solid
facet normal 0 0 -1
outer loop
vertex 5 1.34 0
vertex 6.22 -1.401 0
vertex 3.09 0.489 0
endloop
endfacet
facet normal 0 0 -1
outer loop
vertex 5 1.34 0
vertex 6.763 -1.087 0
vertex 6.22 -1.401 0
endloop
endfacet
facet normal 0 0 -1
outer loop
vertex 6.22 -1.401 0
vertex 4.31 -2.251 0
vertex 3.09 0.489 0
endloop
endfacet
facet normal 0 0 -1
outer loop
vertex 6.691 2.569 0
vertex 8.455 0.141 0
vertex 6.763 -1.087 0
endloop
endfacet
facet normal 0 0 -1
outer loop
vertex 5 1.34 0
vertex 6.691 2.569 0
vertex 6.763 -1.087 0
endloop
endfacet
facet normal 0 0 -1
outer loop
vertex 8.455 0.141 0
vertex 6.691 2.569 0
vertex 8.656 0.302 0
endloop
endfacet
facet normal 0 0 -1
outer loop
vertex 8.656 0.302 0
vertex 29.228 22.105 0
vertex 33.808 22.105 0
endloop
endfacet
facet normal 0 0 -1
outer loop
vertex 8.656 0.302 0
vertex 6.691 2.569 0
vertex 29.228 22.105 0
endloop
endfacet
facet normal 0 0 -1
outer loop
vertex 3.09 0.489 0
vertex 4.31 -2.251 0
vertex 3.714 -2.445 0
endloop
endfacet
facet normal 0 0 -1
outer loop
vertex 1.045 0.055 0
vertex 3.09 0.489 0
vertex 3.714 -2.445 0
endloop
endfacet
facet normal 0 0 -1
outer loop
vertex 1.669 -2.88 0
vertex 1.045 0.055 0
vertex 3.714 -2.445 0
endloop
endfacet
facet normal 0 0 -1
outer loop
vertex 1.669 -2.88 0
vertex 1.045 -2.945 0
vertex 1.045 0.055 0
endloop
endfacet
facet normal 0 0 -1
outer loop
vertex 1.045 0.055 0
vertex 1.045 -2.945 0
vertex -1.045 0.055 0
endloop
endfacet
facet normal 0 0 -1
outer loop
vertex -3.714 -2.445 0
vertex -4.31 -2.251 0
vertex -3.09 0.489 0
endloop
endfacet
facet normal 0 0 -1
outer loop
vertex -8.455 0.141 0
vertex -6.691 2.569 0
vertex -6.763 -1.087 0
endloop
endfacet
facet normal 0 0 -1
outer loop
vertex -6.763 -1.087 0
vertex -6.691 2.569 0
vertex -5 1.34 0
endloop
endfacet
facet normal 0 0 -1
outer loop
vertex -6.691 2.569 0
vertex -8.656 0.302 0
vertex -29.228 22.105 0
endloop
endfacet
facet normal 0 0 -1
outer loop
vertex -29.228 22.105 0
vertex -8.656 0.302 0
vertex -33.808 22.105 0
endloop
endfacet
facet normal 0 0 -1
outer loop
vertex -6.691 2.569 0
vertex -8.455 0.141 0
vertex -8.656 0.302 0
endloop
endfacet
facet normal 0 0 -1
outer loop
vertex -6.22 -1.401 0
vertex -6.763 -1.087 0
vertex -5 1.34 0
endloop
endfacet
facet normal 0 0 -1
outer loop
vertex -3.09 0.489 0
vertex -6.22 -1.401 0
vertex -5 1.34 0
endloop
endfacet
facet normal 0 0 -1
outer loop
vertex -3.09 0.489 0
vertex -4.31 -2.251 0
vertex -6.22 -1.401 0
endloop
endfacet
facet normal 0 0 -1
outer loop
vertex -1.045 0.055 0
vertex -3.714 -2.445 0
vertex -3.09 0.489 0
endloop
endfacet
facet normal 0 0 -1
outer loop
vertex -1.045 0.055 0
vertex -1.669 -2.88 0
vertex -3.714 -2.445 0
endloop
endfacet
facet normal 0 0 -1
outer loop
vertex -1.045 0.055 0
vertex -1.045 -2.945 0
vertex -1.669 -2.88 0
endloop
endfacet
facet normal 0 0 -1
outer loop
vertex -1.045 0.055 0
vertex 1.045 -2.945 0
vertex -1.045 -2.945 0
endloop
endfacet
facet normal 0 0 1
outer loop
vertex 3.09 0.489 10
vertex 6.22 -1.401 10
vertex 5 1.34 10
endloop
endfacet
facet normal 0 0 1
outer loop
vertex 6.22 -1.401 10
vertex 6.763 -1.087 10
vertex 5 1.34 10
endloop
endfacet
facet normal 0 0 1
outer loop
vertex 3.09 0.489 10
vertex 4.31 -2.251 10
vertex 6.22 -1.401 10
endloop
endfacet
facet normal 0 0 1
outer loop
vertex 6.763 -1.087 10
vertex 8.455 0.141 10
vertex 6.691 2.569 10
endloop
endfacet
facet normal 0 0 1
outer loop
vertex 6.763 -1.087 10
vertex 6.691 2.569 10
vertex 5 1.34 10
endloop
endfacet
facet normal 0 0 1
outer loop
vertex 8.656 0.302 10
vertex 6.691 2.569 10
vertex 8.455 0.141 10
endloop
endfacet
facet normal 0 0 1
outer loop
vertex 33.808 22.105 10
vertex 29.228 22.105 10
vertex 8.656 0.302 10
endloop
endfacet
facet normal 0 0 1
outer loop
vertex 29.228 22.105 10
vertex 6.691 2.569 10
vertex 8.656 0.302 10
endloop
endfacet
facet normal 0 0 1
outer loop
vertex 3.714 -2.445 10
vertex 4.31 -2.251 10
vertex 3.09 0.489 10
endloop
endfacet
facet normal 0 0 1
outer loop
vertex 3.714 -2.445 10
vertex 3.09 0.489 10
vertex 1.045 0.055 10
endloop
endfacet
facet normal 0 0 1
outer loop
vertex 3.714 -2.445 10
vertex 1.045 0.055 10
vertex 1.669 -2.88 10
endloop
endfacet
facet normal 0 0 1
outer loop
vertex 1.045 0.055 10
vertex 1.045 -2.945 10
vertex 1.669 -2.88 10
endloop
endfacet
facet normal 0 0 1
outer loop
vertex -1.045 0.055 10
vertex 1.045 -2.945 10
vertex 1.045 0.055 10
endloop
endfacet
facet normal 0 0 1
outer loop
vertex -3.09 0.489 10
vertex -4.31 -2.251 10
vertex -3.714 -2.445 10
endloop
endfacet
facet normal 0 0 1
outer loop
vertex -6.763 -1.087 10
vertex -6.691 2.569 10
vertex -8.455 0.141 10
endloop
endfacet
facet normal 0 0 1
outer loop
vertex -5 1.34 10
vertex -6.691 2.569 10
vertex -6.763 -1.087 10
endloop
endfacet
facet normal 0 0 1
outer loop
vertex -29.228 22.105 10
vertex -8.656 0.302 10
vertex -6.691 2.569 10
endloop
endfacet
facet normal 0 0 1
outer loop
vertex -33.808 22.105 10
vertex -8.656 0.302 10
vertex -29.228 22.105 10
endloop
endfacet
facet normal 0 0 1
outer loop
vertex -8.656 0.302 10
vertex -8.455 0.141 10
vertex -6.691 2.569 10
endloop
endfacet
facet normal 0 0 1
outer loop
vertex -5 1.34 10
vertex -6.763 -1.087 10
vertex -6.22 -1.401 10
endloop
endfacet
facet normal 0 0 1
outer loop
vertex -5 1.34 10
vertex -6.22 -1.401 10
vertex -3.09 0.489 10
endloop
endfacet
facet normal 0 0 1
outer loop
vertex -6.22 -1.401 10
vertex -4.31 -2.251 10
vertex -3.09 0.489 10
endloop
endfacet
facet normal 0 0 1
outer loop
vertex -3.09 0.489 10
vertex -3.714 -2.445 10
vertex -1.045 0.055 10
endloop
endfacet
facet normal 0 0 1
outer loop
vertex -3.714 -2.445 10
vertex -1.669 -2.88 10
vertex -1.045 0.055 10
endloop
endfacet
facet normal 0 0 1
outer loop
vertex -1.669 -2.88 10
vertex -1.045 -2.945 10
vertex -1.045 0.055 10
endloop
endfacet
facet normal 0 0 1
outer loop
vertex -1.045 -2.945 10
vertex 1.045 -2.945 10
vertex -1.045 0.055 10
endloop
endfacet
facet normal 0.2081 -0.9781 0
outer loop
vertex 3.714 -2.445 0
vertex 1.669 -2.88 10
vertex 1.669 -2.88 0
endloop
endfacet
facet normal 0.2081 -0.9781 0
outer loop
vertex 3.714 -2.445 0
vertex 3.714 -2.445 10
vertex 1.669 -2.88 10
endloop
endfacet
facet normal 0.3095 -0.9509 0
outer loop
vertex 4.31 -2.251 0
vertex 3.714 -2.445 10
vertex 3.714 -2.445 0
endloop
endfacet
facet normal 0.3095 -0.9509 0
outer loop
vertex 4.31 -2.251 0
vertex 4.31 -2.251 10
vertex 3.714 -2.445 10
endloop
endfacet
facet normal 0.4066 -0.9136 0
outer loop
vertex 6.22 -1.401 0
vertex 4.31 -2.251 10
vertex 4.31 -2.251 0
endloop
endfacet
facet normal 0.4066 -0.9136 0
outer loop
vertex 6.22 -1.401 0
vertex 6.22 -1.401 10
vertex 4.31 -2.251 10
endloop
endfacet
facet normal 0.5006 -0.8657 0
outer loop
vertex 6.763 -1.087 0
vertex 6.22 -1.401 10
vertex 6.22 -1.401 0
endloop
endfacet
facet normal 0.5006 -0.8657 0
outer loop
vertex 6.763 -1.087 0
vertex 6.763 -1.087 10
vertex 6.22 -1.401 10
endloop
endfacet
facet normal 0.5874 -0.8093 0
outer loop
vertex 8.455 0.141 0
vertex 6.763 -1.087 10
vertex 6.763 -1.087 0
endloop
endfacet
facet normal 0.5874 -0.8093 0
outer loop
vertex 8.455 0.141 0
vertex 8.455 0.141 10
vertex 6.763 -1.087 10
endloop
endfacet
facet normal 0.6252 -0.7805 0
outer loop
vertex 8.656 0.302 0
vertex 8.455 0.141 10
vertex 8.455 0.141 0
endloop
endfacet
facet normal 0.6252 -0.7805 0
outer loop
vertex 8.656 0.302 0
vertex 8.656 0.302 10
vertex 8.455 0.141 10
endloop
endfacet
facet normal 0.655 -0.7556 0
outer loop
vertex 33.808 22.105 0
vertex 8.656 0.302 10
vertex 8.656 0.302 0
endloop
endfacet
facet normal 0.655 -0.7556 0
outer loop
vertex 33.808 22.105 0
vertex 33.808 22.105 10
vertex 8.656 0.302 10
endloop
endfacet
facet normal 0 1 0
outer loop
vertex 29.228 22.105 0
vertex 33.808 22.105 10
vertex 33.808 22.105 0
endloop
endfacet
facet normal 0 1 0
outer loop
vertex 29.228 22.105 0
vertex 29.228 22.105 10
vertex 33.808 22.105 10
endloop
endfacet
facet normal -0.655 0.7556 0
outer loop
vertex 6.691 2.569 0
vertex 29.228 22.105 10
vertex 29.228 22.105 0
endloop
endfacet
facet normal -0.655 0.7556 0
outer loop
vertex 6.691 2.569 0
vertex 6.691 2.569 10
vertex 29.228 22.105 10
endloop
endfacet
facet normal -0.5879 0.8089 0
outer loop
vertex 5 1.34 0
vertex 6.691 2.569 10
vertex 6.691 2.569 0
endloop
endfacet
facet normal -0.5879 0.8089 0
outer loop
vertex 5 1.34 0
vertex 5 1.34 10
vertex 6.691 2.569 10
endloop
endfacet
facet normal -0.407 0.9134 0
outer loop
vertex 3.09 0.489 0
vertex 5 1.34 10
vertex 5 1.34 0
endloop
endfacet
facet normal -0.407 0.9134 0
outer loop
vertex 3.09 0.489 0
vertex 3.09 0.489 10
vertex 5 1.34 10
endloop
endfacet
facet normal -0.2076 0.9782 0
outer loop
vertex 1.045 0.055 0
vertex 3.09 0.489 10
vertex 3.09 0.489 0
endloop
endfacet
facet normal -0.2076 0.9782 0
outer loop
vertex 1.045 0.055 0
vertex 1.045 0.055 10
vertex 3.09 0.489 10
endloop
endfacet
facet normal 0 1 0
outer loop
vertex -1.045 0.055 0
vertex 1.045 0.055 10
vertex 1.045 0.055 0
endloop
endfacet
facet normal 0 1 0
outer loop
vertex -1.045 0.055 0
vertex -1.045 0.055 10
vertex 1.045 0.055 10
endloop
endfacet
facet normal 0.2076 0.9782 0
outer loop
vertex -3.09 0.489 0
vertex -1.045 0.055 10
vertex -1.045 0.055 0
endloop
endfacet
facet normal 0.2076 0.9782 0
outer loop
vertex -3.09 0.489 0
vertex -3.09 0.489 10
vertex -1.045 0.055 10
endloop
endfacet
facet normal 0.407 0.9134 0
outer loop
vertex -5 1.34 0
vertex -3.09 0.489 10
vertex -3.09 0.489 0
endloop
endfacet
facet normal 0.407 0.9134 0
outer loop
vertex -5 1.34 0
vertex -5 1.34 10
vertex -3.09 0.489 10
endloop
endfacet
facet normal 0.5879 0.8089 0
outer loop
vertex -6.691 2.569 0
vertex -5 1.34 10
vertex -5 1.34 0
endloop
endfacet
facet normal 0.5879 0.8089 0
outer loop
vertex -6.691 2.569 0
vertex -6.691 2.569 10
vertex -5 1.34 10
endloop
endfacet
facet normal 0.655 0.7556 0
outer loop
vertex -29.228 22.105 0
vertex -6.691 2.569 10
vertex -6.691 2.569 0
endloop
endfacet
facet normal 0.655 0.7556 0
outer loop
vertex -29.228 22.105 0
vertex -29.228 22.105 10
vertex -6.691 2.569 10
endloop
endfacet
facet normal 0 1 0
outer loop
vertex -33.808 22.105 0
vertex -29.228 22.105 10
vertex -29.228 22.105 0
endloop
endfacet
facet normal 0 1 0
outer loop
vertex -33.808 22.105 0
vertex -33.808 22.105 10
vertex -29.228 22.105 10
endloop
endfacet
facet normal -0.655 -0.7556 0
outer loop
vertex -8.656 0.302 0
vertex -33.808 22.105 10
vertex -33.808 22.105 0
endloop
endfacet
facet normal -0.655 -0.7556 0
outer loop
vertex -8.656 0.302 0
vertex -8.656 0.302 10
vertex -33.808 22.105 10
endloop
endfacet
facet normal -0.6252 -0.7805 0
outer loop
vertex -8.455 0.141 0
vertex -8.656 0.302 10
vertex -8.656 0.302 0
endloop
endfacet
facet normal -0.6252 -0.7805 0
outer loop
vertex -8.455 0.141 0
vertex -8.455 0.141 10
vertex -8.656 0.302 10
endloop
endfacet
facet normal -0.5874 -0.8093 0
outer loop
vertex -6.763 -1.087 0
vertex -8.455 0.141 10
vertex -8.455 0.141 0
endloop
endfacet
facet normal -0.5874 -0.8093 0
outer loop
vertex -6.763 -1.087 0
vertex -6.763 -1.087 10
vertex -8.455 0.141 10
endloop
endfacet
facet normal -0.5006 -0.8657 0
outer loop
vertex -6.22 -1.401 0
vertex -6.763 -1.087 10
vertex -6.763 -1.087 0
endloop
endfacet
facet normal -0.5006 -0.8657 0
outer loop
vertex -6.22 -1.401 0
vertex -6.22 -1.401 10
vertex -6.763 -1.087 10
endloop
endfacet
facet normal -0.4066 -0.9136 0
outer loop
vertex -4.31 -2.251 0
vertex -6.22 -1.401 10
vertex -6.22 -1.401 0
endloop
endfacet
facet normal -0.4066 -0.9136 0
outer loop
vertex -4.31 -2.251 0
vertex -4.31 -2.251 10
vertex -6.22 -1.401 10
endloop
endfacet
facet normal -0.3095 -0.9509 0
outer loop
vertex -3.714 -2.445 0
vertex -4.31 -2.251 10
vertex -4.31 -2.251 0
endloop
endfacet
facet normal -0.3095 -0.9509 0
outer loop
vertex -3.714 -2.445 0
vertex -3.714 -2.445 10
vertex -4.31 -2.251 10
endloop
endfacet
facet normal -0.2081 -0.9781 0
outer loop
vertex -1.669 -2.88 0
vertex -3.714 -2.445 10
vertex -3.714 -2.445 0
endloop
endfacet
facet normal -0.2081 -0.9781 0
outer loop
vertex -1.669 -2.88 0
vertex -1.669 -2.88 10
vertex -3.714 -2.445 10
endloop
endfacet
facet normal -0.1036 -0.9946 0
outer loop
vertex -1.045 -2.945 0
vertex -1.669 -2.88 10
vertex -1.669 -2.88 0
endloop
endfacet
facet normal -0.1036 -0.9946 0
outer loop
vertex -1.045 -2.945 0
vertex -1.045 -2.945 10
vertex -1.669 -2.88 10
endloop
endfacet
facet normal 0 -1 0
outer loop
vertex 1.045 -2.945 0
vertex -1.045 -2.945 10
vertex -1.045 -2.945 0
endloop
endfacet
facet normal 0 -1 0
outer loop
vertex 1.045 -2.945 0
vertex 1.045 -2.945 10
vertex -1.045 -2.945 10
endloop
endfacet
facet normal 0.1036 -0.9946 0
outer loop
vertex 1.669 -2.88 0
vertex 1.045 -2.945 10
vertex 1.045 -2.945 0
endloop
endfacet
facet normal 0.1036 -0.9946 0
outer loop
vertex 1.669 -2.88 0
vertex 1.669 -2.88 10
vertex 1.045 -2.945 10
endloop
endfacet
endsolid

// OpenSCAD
dSchroef = 6;        // bouten waar bidon mee vast zig
bOnder = 51;         // breedste deel van de buis
l=41;                // vanaf schroef tot breedste deel buis
schroefAfstand = 10; // Afstand tussen bevestigings schroeven
dFrameBuis = 35;     // doorsnede framebuis / zadel



buis();

module buis() {
wall = 3;
d=20;
    linear_extrude(height  = schroefAfstand)
    difference() {
        buis2d(wall);
        buis2d(0);
        translate([-bOnder, y() - d / 2, 0])
            #square([bOnder, y()] * 2);
    }
    
}



module buis2d(wall = 0) {
    d = 20;
    x = bOnder / 2;
    pos = [[ 0, d / 2, 0]
         , [-x, y()    , 0]
         , [ x, y()    , 0]];

    offset(wall)
        hull() {
            for(i=pos) {
                translate(i)
                    circle(d=d);
            }
        }

}

// bereken de y aan de hand van buidBreedte en lengte van vlak
function y() = l * cos(asin((bOnder / 2) / l));
